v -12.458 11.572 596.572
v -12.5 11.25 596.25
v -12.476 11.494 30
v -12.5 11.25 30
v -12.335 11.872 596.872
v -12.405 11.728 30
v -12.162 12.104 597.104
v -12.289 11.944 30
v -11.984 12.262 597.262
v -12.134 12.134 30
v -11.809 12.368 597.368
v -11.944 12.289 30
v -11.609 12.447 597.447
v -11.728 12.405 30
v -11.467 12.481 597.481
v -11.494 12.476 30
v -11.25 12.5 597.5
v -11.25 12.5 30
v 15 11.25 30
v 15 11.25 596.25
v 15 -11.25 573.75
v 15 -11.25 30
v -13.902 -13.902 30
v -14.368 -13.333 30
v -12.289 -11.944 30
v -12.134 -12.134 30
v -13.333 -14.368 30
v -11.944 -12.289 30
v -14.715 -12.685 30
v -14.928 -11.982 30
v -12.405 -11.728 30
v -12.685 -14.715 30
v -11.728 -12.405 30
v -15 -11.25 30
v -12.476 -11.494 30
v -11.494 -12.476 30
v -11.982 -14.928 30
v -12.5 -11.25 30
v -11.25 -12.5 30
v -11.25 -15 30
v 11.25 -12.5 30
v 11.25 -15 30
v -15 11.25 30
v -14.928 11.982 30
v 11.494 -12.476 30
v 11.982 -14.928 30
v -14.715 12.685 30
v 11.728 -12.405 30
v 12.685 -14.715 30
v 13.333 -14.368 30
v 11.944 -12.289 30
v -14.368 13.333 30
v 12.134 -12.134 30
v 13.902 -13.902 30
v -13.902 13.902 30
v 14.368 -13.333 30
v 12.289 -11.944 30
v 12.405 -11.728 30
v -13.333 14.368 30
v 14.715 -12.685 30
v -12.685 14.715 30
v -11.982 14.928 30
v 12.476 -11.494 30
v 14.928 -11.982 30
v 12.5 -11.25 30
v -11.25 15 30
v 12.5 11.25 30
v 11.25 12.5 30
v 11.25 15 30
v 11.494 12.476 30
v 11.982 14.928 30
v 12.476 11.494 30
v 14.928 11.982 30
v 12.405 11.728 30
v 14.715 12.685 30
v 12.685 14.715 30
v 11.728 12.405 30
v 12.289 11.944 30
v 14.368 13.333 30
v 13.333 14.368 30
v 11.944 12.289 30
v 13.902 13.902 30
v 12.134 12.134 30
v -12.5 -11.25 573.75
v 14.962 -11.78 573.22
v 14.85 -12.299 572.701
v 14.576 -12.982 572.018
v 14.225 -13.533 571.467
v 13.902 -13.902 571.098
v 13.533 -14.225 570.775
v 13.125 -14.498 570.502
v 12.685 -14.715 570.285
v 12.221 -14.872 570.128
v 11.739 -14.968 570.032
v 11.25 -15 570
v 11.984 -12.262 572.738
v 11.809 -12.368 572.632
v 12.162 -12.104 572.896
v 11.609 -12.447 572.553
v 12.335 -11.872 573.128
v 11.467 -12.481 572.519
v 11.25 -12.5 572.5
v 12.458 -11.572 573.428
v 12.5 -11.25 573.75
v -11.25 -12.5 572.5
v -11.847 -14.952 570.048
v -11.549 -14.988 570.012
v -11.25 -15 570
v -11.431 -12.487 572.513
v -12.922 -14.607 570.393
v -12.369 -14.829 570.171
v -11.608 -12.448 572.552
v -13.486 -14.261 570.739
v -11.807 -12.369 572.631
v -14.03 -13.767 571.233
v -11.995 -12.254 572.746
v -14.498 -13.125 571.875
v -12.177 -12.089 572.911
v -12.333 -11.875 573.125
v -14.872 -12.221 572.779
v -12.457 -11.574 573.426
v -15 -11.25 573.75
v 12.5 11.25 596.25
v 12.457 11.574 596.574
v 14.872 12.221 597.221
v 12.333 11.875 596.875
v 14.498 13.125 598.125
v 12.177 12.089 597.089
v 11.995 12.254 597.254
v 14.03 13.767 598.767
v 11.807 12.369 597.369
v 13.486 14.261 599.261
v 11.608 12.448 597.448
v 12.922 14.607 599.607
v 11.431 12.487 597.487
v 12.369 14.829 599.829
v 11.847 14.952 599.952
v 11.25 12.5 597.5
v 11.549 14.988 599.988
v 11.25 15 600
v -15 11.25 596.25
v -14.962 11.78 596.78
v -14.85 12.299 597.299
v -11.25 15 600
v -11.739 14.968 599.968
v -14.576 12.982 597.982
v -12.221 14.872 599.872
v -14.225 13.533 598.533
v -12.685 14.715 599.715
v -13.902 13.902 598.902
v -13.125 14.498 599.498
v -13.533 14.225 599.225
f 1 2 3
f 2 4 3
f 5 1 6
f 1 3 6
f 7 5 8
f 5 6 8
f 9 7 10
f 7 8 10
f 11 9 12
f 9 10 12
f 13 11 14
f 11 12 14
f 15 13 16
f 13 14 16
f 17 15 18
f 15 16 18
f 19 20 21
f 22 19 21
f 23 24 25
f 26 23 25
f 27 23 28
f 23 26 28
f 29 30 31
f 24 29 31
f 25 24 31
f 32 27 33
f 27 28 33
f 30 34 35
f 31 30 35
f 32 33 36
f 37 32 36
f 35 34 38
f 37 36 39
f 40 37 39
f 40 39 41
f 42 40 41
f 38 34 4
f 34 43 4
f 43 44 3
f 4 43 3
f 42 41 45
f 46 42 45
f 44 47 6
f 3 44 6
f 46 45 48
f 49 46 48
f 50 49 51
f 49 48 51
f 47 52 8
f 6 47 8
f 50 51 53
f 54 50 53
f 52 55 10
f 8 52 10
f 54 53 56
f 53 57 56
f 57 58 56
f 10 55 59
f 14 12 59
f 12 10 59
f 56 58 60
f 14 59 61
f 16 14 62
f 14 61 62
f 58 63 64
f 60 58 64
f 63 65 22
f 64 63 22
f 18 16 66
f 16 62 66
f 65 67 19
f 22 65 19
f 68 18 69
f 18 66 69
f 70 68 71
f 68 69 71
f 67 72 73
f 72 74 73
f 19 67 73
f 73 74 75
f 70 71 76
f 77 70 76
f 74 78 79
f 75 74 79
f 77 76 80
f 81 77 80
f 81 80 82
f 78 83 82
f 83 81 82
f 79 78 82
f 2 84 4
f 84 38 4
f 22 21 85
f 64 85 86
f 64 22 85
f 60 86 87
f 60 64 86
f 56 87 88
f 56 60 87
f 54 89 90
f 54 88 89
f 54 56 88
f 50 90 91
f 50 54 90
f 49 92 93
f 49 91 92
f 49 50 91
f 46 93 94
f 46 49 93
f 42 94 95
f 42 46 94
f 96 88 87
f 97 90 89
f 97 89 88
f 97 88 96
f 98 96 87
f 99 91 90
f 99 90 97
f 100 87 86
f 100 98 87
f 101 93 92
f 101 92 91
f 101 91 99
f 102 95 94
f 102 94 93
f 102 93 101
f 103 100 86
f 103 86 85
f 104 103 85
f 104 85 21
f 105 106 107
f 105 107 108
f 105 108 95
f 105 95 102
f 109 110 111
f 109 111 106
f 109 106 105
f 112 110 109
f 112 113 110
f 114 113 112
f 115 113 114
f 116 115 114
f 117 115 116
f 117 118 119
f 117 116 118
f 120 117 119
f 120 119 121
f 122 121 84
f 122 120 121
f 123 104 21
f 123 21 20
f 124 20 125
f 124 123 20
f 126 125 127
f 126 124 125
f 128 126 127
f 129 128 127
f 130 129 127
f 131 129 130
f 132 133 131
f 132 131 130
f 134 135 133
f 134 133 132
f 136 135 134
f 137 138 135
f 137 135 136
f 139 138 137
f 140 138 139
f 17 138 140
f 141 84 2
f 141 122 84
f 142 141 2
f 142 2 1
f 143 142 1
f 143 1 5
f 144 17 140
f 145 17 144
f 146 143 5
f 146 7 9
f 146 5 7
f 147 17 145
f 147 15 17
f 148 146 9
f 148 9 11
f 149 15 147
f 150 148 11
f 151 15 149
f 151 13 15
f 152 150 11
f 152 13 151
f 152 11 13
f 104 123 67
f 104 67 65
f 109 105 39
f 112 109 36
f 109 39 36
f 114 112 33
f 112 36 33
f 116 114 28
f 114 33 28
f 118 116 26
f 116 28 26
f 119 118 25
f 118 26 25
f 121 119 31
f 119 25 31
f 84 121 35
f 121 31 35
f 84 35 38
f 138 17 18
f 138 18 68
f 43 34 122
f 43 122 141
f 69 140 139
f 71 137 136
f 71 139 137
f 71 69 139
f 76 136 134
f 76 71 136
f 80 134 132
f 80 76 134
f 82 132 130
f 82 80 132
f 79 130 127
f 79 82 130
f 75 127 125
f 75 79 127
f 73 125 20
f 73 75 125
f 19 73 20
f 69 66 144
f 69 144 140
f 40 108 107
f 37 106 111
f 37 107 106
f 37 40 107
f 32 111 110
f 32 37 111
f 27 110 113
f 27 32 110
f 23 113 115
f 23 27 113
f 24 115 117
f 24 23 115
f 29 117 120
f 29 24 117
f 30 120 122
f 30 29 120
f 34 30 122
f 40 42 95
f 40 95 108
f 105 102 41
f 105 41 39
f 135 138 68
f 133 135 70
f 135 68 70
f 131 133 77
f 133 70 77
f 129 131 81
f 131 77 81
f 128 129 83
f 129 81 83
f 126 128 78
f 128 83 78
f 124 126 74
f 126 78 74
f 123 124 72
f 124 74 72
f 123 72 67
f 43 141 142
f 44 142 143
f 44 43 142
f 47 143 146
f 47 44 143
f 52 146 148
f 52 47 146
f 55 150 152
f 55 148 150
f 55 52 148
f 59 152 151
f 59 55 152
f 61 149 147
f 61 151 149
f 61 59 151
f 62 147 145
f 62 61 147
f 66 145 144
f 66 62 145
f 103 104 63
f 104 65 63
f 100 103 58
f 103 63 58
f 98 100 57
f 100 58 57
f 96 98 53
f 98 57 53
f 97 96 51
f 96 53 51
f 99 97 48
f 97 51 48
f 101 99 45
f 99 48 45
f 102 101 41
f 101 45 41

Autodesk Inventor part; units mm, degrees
ref_plane "Start plane" through (0, 0, 30) normal (0, 0, 1) x (1, 0, 0)
ref_plane "End plane" through (0, 0, 600) normal (0, 0, 1) x (1, 0, 0)
sketch "Sketch" plane through (0, 0, 0) normal (0, 0, 1) x (1, 0, 0)
  line L0 (-15, -11.25) -> (-15, 11.25)
  line L1 (-11.25, 15) -> (11.25, 15)
  line L2 (15, 11.25) -> (15, -11.25)
  line L3 (11.25, -15) -> (-11.25, -15)
  arc A0 (-15, -11.25) -> (-11.25, -15) centre (-11.25, -11.25) ccw
  arc A1 (-11.25, 15) -> (-15, 11.25) centre (-11.25, 11.25) ccw
  arc A2 (15, 11.25) -> (11.25, 15) centre (11.25, 11.25) ccw
  arc A3 (11.25, -15) -> (15, -11.25) centre (11.25, -11.25) ccw
  arc A4 (-11.25, 12.5) -> (-12.5, 11.25) centre (-11.25, 11.25) ccw
  line L4 (-11.25, 12.5) -> (11.25, 12.5)
  arc A5 (12.5, 11.25) -> (11.25, 12.5) centre (11.25, 11.25) ccw
  line L5 (12.5, 11.25) -> (12.5, -11.25)
  arc A6 (11.25, -12.5) -> (12.5, -11.25) centre (11.25, -11.25) ccw
  line L6 (11.25, -12.5) -> (-11.25, -12.5)
  arc A7 (-12.5, -11.25) -> (-11.25, -12.5) centre (-11.25, -11.25) ccw
  line L7 (-12.5, -11.25) -> (-12.5, 11.25)
  line L8 (0, 22.0873) -> (0, -22.0873) construction
  line L9 (-22.0873, 0) -> (22.0873, 0) construction
  dimension "d7" = 3.75
  dimension "d10" = 30
  dimension "d11" = 30
  dimension "d12" = 2.5
  dimension "d15" = 15
  dimension "d16" = 15
extrude "Body" add sketch "Sketch" along normal up to surface (570 mm away) from surface at 30
sketch "Sketch3" plane through (0, 0, 0) normal (0, 0, 1) x (1, 0, 0)
  line L0 (0, 0) -> (10, 0)
ref_plane "Work Plane3" through (0, 0, 0) normal (0, -1, 0) x (1, 0, 0)
sketch "Sketch4" plane through (0, 0, 0) normal (0, -1, 0) x (1, 0, 0)
  line L0 (-2, 30) -> (12, 30)
  line L1 (-2, 600) -> (12, 600)
  dimension "d18" = 570
ref_plane "Work Plane4" through (425, -558.75, 30) normal (0, 0, -1) x (-1, 0, 0)
split "Split1" plane through (425, -558.75, 30) removes the side toward (0, 0, -1)
ref_plane "Work Plane5" through (0, 15, 600) normal (0, -0.7071, 0.7071) x (1, 0, 0)
split "Split2" plane through (0, 15, 600) removes the side toward (0, -0.7071, 0.7071)
ref_plane "Work Plane6" through (385, 11.25, 30) normal (0, 0, -1) x (-1, 0, 0)
split "Split3" plane through (385, 11.25, 30) removes the side toward (0, 0, -1)
equation "\"d7\" = G_IR"
equation "\"d10\" = G_H"
equation "\"d11\" = G_W"
equation "\"d12\" = G_T"
equation "\"d15\" = 0.5 * d10"
equation "\"d16\" = 0.5 * d11"
equation "\"d3\" = G_L"
equation "\"G_W\" = 30"
equation "\"G_H\" = 30"
equation "\"G_T\" = 2.5"
equation "\"G_IR\" = 3.75"
equation "\"G_L\" = d18"
equation "\"G_OFFSET_END\" = 0"
properties part number "DIN EN 10305-5 - 30 x 30 x 2,5  - 570" material "Steel, Mild"
